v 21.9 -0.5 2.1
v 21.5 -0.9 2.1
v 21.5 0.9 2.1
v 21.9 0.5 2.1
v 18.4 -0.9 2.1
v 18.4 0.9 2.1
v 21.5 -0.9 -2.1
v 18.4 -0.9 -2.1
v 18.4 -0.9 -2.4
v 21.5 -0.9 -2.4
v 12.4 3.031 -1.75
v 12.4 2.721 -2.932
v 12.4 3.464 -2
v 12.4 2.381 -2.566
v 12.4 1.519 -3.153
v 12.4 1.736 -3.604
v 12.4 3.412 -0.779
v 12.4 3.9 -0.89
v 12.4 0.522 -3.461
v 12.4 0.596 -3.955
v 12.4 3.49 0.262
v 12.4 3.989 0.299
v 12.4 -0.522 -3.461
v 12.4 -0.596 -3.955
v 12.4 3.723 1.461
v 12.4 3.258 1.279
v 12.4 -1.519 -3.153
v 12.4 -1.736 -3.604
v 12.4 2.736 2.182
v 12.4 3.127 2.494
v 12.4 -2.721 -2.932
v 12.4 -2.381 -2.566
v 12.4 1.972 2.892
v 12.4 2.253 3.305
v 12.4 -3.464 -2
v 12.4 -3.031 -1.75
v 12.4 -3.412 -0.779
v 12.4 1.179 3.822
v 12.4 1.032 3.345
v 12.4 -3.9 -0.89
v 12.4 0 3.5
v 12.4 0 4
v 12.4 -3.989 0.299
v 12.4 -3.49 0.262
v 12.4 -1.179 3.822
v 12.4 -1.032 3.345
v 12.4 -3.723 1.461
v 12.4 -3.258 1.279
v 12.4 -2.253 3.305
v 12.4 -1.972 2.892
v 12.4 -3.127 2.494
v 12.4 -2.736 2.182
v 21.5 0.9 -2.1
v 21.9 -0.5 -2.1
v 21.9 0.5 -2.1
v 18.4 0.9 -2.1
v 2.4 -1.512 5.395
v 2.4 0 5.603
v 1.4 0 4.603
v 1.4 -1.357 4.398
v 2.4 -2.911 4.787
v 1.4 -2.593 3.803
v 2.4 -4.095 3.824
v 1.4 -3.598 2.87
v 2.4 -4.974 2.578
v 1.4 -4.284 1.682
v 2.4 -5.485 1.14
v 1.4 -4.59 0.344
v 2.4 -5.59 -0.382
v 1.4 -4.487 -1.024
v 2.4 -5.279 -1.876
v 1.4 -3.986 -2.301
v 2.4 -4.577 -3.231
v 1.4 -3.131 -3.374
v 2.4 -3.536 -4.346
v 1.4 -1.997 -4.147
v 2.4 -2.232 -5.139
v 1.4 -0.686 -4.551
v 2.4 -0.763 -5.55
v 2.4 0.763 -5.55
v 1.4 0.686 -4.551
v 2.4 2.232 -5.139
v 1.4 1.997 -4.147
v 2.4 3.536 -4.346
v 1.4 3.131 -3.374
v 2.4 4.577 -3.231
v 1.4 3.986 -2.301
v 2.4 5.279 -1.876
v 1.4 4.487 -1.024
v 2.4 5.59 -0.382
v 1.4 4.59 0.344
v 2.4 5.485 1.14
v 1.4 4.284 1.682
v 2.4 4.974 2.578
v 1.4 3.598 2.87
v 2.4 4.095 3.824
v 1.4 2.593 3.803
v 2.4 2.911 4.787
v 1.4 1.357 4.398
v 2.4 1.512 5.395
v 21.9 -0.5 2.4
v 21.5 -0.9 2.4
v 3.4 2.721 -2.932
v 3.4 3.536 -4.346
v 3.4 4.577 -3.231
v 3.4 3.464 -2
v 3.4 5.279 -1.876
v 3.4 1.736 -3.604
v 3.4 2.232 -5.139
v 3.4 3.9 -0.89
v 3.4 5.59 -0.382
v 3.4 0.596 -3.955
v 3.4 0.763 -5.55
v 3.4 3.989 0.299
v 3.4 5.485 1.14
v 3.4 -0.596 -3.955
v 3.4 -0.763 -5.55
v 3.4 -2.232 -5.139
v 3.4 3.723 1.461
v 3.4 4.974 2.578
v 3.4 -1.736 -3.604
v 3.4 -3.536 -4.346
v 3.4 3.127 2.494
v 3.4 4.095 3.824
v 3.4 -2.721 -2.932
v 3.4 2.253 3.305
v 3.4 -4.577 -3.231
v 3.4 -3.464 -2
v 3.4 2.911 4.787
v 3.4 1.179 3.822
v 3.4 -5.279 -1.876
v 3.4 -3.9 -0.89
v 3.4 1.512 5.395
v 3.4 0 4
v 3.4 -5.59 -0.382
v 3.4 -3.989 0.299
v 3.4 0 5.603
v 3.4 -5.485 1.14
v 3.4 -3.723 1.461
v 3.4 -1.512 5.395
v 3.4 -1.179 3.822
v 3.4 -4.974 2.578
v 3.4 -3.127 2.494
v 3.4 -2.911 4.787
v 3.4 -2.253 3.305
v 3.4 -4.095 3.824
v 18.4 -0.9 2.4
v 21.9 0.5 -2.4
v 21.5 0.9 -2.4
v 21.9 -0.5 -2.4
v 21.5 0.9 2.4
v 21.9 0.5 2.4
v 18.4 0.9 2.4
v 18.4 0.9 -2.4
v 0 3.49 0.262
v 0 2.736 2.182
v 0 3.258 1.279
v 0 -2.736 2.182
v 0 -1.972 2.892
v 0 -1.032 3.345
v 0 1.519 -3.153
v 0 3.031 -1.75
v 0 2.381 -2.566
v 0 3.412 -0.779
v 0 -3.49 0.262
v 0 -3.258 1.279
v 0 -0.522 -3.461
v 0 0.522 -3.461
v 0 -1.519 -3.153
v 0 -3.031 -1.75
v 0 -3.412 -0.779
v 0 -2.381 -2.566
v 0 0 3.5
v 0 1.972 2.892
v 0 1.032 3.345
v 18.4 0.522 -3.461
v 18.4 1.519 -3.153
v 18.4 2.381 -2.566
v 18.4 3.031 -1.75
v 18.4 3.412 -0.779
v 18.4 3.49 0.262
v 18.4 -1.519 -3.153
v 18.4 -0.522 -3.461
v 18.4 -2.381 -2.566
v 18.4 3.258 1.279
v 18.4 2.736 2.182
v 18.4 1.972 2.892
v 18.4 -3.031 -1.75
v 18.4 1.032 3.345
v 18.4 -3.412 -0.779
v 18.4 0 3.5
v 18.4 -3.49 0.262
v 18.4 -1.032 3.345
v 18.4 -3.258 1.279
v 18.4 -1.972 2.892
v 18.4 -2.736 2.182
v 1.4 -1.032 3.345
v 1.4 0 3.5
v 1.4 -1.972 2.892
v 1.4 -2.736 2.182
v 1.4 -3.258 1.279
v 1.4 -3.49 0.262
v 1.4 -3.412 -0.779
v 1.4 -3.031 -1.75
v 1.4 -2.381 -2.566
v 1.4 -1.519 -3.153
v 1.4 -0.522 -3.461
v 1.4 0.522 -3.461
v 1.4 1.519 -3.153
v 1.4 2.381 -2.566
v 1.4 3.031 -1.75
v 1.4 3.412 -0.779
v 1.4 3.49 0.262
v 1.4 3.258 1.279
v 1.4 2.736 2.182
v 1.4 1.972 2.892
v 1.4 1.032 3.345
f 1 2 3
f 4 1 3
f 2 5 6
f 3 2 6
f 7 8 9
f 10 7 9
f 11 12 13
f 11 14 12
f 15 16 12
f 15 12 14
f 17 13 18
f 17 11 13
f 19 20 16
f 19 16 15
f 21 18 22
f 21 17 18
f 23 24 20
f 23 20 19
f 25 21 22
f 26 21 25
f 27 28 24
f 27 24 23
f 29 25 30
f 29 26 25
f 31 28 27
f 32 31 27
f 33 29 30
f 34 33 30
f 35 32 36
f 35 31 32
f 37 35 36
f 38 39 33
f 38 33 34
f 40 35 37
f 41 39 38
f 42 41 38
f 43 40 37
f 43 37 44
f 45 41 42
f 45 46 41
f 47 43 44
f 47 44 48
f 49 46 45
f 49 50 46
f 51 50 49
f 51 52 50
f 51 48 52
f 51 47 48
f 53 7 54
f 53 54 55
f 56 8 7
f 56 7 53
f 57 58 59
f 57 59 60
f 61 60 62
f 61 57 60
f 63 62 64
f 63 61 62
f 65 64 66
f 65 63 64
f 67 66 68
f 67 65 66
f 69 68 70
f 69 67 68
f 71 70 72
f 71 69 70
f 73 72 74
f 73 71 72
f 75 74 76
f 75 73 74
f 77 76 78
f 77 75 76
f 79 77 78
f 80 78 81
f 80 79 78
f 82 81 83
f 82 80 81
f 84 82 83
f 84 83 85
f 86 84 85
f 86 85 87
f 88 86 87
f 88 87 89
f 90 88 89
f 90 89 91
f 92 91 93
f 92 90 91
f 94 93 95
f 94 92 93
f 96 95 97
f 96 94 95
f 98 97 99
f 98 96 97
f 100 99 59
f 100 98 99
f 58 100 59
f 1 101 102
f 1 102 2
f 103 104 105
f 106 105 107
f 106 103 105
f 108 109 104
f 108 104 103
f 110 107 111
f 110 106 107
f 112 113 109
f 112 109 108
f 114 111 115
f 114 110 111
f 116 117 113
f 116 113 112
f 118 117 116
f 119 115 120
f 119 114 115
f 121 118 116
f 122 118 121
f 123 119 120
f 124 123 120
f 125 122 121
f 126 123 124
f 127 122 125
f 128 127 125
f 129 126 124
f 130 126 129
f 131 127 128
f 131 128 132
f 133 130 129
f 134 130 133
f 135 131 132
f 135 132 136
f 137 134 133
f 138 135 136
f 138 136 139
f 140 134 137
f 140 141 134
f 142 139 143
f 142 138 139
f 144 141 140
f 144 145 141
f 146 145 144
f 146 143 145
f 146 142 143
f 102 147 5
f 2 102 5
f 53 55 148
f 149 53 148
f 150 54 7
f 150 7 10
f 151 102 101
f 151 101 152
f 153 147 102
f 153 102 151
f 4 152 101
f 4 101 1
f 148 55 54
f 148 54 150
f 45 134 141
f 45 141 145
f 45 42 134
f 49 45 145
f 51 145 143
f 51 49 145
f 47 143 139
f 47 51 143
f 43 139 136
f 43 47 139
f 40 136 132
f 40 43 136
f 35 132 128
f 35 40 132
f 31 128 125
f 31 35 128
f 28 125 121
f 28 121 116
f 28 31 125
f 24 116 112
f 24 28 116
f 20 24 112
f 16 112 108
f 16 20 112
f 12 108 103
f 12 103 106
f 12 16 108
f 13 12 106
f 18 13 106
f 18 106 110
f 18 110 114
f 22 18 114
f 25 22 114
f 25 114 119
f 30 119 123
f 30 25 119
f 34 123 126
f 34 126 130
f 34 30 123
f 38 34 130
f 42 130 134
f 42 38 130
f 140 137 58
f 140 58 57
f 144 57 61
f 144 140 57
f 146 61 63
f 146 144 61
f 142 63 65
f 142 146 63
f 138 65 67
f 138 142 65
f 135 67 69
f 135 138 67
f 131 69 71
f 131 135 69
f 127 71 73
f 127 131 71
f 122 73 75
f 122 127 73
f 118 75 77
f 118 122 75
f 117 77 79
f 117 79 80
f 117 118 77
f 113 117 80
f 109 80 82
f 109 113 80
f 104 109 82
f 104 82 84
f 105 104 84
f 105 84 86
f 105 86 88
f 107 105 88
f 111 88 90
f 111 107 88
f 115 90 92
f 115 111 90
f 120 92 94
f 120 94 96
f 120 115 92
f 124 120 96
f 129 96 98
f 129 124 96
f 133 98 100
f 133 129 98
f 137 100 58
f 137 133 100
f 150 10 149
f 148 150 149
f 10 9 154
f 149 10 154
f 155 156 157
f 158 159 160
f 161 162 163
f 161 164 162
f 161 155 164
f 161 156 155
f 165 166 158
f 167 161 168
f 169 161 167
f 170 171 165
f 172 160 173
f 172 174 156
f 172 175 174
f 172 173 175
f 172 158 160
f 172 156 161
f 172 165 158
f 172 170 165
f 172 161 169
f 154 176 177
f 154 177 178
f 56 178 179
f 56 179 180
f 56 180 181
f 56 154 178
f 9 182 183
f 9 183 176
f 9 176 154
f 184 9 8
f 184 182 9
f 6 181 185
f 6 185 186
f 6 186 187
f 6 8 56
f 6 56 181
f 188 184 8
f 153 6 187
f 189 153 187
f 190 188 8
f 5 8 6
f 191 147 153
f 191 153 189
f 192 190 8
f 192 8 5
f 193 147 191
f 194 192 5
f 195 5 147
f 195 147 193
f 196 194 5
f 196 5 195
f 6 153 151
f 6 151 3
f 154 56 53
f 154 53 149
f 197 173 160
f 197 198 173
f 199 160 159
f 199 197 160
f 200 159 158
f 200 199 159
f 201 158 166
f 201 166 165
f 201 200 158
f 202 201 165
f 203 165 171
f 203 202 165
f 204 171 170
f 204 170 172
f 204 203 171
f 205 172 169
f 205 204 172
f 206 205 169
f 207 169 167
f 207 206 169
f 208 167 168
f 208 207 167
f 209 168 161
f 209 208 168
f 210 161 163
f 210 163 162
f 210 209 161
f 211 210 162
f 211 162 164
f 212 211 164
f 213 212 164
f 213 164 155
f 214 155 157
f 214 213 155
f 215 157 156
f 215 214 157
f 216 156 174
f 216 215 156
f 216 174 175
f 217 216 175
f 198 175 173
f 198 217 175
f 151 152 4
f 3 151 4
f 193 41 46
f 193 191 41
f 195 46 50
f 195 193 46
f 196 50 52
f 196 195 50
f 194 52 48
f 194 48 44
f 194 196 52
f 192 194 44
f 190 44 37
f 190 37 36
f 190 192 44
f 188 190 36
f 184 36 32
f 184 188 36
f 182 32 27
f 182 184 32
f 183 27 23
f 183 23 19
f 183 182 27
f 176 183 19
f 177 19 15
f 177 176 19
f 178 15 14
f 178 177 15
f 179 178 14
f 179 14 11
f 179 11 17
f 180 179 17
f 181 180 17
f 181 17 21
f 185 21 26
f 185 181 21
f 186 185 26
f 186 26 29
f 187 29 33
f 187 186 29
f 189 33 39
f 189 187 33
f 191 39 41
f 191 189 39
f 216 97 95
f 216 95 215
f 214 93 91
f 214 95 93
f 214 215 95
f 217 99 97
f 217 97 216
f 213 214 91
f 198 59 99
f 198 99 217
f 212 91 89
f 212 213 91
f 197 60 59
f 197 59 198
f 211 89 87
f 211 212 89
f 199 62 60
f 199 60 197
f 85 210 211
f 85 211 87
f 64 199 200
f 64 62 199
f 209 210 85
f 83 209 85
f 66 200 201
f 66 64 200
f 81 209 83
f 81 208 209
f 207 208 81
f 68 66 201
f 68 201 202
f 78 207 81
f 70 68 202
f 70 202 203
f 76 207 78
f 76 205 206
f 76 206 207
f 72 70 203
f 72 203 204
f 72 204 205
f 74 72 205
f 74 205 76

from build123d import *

# Parameters (mm, degrees)
CHAMFER_1_SIZE  = 1
SKETCH_4_W      = 0.3
SKETCH_4_H      = 1.8
EXTRUDE_1_DEPTH = 3.5
CHAMFER_2_SIZE  = 0.4


with BuildPart() as part:
    # 草图2 → 旋转2 (revolve)
    with BuildSketch(Plane.XY, mode=Mode.PRIVATE) as revolve_2_sk:
        Polygon((0, 0), (0, -3.5), (1.4, -3.5), (1.4, -5.60259245), (3.4, -5.60259245), (3.4, -4), (12.4, -4), (12.4, -3.5), (18.4, -3.5), (18.4, 0), align=None)
    revolve(revolve_2_sk.sketch.rotate(Axis((-3.092696523, 0, 0), (1, 0, 0)), 270), axis=Axis((-3.092696523, 0, 0), (1, 0, 0)))

    # 倒角1
    chamfer_1_edges = [part.edges().sort_by_distance(p)[0] for p in [
        (1.4, 0, -5.60259245),
    ]]
    chamfer(chamfer_1_edges, length=CHAMFER_1_SIZE)

    # 草图4 → 凸台-拉伸1 (add)
    with BuildSketch(Plane(origin=(18.4, 0, 0), x_dir=(0, 0, -1), z_dir=(1, 0, 0))):
        with Locations((-2.25, 0)):
            Rectangle(SKETCH_4_W, SKETCH_4_H)
        with Locations((2.25, 0)):
            Rectangle(SKETCH_4_W, SKETCH_4_H)
    extrude(amount=EXTRUDE_1_DEPTH)

    # 倒角2
    chamfer_2_edges = [part.edges().sort_by_distance(p)[0] for p in [
        (21.9, -0.9, 2.25),
        (21.9, 0.9, 2.25),
        (21.9, -0.9, -2.25),
        (21.9, 0.9, -2.25),
    ]]
    chamfer(chamfer_2_edges, length=CHAMFER_2_SIZE)


solid = part.part
